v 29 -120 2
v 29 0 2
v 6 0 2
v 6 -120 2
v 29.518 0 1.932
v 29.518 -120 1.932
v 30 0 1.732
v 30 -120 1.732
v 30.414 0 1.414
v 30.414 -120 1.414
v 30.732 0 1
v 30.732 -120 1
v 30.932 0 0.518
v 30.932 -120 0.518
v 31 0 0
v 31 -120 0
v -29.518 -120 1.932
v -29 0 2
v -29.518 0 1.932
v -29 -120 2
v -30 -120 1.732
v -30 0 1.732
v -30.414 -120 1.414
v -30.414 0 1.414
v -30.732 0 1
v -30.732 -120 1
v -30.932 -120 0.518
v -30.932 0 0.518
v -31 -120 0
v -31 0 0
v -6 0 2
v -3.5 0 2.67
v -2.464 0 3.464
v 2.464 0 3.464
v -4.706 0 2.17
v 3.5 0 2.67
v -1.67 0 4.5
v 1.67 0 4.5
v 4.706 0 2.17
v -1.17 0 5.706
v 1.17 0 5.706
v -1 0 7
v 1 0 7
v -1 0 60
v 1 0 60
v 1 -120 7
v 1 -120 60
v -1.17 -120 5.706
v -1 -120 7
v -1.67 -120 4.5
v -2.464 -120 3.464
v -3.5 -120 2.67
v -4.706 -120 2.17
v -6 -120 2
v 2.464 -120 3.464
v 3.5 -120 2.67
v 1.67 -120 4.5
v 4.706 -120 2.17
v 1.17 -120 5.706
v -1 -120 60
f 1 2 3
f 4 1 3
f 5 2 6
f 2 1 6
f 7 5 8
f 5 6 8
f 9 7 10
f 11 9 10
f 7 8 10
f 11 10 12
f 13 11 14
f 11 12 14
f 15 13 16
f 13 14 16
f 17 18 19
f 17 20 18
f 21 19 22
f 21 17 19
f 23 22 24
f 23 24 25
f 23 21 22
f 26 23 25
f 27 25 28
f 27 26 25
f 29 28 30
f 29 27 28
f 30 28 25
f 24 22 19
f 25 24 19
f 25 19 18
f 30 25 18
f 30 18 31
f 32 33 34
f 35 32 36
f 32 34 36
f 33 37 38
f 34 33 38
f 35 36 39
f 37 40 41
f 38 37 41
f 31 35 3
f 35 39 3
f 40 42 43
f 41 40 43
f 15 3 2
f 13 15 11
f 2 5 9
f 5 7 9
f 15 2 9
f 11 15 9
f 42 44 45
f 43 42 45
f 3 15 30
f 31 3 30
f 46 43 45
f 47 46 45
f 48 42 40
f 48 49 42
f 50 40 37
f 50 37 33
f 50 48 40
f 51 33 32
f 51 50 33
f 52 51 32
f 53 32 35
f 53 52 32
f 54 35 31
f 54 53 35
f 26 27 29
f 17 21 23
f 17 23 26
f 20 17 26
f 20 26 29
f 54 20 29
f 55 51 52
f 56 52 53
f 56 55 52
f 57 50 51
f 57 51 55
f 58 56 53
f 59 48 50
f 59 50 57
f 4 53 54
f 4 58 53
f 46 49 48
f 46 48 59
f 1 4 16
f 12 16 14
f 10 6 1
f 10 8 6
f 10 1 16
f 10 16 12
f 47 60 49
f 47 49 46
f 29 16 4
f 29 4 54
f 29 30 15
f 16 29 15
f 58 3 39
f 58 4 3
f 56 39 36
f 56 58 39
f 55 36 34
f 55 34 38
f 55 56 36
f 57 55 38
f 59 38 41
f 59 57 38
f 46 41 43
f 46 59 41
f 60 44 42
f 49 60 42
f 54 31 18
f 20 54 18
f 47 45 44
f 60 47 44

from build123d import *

# Parameters (mm, degrees)
F1_DEPTH = 120
F2_R     = 5
F3_R     = 1.99999


# Not quite as in the source:
# - a fillet or chamfer is up to 0.001 mm smaller than in the source, because OpenCascade refuses the exact size


with BuildPart() as f1:
    # F0 (on Front) → F1 (new body)
    with BuildSketch(Plane.XZ):
        Polygon((1, 60), (0, 60), (-1, 60), (-1, 2), (-31, 2), (-31, 0), (0, 0), (31, 0), (31, 2), (1, 2), align=None)
    extrude(amount=F1_DEPTH)

    # F2
    f2_edges = [f1.edges().sort_by_distance(p)[0] for p in [
        (-1, -60, 2),
        (1, -60, 2),
    ]]
    fillet(f2_edges, radius=F2_R)

    # F3 (radius 2 in the source; OpenCascade refuses exactly that, so slightly less here)
    f3_edges = [f1.edges().sort_by_distance(p)[0] for p in [
        (31, -60, 2),
        (-31, -60, 2),
    ]]
    fillet(f3_edges, radius=F3_R)


solid = f1.part
